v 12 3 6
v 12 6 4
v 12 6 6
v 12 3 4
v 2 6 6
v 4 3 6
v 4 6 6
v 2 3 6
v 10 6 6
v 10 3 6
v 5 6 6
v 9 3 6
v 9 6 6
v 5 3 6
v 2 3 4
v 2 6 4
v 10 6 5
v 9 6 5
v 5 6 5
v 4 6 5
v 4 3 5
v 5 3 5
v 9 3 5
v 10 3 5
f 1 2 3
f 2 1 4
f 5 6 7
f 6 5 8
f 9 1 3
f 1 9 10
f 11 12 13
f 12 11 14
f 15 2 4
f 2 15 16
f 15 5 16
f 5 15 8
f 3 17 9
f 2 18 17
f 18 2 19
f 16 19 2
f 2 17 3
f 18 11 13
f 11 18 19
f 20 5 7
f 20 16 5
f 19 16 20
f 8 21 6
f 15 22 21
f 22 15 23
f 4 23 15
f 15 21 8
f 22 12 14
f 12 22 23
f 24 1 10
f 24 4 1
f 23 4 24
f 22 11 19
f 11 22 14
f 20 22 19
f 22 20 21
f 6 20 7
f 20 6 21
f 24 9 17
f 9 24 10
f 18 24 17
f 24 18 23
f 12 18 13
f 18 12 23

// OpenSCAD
// file: aBlock.scad
// Copyright Stephen Morrisson 2018
// All rights reserved

module aBlock(c, xS, yS, zS)
{
    color(c)
        cube([xS, yS, zS]);
}


module tBlock(c, xO, yO, zO, xS, yS, zS)
{
    translate([xO, yO, zO])
        aBlock(c, xS, yS, zS);
}

module rBlock(c, rX, rY, rZ, xS, yS, zS)
{
    rotate([rX, rY, rZ])
        aBlock(c, xS, yS, zS);
}

module trBlock(c, xO, yO, zO, rX, rY, rZ, xS, yS, zS)
{
    color(c)
    translate([xO, yO, zO])
       rBlock(c, rX, rY, rZ, xS, yS, zS);
}

//aBlock("yellow", 1,2,3);
//tBlock("red", 10, 10, 10, 1, 2,3);
trBlock("orange", 20,0,0,  0,0,0, 8,4,1);
trBlock("blue", 10, -10, 0, 0, 90, 0, 8, 4, 1);
trBlock("gray", -10, 10, 0, 0,0,90, 8,4,1);
trBlock("yellow", 0,0,0, 90,0,0, 8,4,1);
trBlock("green", -10,-10,-10, 90,270,45, 8,4,1);
// main file
// Copyright Stephen Morrisson 2018
// All rights reserved

use <aBlock.scad>

// NO notch offset from end
// NO notch size


// S refer to bar info
// NO Notch offset from low end,
// NS Notch size 


// oversize notch to remove false thin walls.
module aTopNotch(c, xS, yS, zS, xNO, xNS, zNS)
{
    tBlock(c, xNO, -1, zS - zNS, xNS, yS + 2, zNS + 1);
}

module aNotchedBar(c, xS, yS, zS, xNO, xNS, zNS)
{
    difference()
    {
        aBlock(c, xS, yS, zS);
	aTopNotch(c, xS, yS, zS, xNO, xNS, zNS);
    }
}

module aTop2NotchedBar(c, xS, yS, zS, xNO, xNS, zNS)
{
    difference()
    {
	aNotchedBar(c, xS, yS, zS, xNO, xNS, zNS);
	aTopNotch(c, xS, yS, zS, xS - xNS - xNO, xNS, zNS);
    }
}


module tNotchedBar(c, xO, yO, zO, xS, yS, zS,
                        xNO, xNS, zNS)
{
    translate([xO,yO,zO])
	aNotchedBar(c, xS, yS, zS, xNO, xNS, zNS);
}

module tTop2Notchedbar(c, xO, yO, zO,
            xS, yS, zS, xNO, xNS, zNS)
{
    translate([xO, yO, zO])
        aTop2NotchedBar(c, xS, yS, zS, xNO, xNS, zNS);
}



//aNotchedBar("green", 10,3,2,  2,1,1);
//tNotchedBar("green", 0,10,0, 5,3,2,  2,1,1);
//aTop2NotchedBar("green", 10,3,2,  2,1,1);
tTop2Notchedbar("green", 2,3,4, 10,3,2,  2,1,1);
